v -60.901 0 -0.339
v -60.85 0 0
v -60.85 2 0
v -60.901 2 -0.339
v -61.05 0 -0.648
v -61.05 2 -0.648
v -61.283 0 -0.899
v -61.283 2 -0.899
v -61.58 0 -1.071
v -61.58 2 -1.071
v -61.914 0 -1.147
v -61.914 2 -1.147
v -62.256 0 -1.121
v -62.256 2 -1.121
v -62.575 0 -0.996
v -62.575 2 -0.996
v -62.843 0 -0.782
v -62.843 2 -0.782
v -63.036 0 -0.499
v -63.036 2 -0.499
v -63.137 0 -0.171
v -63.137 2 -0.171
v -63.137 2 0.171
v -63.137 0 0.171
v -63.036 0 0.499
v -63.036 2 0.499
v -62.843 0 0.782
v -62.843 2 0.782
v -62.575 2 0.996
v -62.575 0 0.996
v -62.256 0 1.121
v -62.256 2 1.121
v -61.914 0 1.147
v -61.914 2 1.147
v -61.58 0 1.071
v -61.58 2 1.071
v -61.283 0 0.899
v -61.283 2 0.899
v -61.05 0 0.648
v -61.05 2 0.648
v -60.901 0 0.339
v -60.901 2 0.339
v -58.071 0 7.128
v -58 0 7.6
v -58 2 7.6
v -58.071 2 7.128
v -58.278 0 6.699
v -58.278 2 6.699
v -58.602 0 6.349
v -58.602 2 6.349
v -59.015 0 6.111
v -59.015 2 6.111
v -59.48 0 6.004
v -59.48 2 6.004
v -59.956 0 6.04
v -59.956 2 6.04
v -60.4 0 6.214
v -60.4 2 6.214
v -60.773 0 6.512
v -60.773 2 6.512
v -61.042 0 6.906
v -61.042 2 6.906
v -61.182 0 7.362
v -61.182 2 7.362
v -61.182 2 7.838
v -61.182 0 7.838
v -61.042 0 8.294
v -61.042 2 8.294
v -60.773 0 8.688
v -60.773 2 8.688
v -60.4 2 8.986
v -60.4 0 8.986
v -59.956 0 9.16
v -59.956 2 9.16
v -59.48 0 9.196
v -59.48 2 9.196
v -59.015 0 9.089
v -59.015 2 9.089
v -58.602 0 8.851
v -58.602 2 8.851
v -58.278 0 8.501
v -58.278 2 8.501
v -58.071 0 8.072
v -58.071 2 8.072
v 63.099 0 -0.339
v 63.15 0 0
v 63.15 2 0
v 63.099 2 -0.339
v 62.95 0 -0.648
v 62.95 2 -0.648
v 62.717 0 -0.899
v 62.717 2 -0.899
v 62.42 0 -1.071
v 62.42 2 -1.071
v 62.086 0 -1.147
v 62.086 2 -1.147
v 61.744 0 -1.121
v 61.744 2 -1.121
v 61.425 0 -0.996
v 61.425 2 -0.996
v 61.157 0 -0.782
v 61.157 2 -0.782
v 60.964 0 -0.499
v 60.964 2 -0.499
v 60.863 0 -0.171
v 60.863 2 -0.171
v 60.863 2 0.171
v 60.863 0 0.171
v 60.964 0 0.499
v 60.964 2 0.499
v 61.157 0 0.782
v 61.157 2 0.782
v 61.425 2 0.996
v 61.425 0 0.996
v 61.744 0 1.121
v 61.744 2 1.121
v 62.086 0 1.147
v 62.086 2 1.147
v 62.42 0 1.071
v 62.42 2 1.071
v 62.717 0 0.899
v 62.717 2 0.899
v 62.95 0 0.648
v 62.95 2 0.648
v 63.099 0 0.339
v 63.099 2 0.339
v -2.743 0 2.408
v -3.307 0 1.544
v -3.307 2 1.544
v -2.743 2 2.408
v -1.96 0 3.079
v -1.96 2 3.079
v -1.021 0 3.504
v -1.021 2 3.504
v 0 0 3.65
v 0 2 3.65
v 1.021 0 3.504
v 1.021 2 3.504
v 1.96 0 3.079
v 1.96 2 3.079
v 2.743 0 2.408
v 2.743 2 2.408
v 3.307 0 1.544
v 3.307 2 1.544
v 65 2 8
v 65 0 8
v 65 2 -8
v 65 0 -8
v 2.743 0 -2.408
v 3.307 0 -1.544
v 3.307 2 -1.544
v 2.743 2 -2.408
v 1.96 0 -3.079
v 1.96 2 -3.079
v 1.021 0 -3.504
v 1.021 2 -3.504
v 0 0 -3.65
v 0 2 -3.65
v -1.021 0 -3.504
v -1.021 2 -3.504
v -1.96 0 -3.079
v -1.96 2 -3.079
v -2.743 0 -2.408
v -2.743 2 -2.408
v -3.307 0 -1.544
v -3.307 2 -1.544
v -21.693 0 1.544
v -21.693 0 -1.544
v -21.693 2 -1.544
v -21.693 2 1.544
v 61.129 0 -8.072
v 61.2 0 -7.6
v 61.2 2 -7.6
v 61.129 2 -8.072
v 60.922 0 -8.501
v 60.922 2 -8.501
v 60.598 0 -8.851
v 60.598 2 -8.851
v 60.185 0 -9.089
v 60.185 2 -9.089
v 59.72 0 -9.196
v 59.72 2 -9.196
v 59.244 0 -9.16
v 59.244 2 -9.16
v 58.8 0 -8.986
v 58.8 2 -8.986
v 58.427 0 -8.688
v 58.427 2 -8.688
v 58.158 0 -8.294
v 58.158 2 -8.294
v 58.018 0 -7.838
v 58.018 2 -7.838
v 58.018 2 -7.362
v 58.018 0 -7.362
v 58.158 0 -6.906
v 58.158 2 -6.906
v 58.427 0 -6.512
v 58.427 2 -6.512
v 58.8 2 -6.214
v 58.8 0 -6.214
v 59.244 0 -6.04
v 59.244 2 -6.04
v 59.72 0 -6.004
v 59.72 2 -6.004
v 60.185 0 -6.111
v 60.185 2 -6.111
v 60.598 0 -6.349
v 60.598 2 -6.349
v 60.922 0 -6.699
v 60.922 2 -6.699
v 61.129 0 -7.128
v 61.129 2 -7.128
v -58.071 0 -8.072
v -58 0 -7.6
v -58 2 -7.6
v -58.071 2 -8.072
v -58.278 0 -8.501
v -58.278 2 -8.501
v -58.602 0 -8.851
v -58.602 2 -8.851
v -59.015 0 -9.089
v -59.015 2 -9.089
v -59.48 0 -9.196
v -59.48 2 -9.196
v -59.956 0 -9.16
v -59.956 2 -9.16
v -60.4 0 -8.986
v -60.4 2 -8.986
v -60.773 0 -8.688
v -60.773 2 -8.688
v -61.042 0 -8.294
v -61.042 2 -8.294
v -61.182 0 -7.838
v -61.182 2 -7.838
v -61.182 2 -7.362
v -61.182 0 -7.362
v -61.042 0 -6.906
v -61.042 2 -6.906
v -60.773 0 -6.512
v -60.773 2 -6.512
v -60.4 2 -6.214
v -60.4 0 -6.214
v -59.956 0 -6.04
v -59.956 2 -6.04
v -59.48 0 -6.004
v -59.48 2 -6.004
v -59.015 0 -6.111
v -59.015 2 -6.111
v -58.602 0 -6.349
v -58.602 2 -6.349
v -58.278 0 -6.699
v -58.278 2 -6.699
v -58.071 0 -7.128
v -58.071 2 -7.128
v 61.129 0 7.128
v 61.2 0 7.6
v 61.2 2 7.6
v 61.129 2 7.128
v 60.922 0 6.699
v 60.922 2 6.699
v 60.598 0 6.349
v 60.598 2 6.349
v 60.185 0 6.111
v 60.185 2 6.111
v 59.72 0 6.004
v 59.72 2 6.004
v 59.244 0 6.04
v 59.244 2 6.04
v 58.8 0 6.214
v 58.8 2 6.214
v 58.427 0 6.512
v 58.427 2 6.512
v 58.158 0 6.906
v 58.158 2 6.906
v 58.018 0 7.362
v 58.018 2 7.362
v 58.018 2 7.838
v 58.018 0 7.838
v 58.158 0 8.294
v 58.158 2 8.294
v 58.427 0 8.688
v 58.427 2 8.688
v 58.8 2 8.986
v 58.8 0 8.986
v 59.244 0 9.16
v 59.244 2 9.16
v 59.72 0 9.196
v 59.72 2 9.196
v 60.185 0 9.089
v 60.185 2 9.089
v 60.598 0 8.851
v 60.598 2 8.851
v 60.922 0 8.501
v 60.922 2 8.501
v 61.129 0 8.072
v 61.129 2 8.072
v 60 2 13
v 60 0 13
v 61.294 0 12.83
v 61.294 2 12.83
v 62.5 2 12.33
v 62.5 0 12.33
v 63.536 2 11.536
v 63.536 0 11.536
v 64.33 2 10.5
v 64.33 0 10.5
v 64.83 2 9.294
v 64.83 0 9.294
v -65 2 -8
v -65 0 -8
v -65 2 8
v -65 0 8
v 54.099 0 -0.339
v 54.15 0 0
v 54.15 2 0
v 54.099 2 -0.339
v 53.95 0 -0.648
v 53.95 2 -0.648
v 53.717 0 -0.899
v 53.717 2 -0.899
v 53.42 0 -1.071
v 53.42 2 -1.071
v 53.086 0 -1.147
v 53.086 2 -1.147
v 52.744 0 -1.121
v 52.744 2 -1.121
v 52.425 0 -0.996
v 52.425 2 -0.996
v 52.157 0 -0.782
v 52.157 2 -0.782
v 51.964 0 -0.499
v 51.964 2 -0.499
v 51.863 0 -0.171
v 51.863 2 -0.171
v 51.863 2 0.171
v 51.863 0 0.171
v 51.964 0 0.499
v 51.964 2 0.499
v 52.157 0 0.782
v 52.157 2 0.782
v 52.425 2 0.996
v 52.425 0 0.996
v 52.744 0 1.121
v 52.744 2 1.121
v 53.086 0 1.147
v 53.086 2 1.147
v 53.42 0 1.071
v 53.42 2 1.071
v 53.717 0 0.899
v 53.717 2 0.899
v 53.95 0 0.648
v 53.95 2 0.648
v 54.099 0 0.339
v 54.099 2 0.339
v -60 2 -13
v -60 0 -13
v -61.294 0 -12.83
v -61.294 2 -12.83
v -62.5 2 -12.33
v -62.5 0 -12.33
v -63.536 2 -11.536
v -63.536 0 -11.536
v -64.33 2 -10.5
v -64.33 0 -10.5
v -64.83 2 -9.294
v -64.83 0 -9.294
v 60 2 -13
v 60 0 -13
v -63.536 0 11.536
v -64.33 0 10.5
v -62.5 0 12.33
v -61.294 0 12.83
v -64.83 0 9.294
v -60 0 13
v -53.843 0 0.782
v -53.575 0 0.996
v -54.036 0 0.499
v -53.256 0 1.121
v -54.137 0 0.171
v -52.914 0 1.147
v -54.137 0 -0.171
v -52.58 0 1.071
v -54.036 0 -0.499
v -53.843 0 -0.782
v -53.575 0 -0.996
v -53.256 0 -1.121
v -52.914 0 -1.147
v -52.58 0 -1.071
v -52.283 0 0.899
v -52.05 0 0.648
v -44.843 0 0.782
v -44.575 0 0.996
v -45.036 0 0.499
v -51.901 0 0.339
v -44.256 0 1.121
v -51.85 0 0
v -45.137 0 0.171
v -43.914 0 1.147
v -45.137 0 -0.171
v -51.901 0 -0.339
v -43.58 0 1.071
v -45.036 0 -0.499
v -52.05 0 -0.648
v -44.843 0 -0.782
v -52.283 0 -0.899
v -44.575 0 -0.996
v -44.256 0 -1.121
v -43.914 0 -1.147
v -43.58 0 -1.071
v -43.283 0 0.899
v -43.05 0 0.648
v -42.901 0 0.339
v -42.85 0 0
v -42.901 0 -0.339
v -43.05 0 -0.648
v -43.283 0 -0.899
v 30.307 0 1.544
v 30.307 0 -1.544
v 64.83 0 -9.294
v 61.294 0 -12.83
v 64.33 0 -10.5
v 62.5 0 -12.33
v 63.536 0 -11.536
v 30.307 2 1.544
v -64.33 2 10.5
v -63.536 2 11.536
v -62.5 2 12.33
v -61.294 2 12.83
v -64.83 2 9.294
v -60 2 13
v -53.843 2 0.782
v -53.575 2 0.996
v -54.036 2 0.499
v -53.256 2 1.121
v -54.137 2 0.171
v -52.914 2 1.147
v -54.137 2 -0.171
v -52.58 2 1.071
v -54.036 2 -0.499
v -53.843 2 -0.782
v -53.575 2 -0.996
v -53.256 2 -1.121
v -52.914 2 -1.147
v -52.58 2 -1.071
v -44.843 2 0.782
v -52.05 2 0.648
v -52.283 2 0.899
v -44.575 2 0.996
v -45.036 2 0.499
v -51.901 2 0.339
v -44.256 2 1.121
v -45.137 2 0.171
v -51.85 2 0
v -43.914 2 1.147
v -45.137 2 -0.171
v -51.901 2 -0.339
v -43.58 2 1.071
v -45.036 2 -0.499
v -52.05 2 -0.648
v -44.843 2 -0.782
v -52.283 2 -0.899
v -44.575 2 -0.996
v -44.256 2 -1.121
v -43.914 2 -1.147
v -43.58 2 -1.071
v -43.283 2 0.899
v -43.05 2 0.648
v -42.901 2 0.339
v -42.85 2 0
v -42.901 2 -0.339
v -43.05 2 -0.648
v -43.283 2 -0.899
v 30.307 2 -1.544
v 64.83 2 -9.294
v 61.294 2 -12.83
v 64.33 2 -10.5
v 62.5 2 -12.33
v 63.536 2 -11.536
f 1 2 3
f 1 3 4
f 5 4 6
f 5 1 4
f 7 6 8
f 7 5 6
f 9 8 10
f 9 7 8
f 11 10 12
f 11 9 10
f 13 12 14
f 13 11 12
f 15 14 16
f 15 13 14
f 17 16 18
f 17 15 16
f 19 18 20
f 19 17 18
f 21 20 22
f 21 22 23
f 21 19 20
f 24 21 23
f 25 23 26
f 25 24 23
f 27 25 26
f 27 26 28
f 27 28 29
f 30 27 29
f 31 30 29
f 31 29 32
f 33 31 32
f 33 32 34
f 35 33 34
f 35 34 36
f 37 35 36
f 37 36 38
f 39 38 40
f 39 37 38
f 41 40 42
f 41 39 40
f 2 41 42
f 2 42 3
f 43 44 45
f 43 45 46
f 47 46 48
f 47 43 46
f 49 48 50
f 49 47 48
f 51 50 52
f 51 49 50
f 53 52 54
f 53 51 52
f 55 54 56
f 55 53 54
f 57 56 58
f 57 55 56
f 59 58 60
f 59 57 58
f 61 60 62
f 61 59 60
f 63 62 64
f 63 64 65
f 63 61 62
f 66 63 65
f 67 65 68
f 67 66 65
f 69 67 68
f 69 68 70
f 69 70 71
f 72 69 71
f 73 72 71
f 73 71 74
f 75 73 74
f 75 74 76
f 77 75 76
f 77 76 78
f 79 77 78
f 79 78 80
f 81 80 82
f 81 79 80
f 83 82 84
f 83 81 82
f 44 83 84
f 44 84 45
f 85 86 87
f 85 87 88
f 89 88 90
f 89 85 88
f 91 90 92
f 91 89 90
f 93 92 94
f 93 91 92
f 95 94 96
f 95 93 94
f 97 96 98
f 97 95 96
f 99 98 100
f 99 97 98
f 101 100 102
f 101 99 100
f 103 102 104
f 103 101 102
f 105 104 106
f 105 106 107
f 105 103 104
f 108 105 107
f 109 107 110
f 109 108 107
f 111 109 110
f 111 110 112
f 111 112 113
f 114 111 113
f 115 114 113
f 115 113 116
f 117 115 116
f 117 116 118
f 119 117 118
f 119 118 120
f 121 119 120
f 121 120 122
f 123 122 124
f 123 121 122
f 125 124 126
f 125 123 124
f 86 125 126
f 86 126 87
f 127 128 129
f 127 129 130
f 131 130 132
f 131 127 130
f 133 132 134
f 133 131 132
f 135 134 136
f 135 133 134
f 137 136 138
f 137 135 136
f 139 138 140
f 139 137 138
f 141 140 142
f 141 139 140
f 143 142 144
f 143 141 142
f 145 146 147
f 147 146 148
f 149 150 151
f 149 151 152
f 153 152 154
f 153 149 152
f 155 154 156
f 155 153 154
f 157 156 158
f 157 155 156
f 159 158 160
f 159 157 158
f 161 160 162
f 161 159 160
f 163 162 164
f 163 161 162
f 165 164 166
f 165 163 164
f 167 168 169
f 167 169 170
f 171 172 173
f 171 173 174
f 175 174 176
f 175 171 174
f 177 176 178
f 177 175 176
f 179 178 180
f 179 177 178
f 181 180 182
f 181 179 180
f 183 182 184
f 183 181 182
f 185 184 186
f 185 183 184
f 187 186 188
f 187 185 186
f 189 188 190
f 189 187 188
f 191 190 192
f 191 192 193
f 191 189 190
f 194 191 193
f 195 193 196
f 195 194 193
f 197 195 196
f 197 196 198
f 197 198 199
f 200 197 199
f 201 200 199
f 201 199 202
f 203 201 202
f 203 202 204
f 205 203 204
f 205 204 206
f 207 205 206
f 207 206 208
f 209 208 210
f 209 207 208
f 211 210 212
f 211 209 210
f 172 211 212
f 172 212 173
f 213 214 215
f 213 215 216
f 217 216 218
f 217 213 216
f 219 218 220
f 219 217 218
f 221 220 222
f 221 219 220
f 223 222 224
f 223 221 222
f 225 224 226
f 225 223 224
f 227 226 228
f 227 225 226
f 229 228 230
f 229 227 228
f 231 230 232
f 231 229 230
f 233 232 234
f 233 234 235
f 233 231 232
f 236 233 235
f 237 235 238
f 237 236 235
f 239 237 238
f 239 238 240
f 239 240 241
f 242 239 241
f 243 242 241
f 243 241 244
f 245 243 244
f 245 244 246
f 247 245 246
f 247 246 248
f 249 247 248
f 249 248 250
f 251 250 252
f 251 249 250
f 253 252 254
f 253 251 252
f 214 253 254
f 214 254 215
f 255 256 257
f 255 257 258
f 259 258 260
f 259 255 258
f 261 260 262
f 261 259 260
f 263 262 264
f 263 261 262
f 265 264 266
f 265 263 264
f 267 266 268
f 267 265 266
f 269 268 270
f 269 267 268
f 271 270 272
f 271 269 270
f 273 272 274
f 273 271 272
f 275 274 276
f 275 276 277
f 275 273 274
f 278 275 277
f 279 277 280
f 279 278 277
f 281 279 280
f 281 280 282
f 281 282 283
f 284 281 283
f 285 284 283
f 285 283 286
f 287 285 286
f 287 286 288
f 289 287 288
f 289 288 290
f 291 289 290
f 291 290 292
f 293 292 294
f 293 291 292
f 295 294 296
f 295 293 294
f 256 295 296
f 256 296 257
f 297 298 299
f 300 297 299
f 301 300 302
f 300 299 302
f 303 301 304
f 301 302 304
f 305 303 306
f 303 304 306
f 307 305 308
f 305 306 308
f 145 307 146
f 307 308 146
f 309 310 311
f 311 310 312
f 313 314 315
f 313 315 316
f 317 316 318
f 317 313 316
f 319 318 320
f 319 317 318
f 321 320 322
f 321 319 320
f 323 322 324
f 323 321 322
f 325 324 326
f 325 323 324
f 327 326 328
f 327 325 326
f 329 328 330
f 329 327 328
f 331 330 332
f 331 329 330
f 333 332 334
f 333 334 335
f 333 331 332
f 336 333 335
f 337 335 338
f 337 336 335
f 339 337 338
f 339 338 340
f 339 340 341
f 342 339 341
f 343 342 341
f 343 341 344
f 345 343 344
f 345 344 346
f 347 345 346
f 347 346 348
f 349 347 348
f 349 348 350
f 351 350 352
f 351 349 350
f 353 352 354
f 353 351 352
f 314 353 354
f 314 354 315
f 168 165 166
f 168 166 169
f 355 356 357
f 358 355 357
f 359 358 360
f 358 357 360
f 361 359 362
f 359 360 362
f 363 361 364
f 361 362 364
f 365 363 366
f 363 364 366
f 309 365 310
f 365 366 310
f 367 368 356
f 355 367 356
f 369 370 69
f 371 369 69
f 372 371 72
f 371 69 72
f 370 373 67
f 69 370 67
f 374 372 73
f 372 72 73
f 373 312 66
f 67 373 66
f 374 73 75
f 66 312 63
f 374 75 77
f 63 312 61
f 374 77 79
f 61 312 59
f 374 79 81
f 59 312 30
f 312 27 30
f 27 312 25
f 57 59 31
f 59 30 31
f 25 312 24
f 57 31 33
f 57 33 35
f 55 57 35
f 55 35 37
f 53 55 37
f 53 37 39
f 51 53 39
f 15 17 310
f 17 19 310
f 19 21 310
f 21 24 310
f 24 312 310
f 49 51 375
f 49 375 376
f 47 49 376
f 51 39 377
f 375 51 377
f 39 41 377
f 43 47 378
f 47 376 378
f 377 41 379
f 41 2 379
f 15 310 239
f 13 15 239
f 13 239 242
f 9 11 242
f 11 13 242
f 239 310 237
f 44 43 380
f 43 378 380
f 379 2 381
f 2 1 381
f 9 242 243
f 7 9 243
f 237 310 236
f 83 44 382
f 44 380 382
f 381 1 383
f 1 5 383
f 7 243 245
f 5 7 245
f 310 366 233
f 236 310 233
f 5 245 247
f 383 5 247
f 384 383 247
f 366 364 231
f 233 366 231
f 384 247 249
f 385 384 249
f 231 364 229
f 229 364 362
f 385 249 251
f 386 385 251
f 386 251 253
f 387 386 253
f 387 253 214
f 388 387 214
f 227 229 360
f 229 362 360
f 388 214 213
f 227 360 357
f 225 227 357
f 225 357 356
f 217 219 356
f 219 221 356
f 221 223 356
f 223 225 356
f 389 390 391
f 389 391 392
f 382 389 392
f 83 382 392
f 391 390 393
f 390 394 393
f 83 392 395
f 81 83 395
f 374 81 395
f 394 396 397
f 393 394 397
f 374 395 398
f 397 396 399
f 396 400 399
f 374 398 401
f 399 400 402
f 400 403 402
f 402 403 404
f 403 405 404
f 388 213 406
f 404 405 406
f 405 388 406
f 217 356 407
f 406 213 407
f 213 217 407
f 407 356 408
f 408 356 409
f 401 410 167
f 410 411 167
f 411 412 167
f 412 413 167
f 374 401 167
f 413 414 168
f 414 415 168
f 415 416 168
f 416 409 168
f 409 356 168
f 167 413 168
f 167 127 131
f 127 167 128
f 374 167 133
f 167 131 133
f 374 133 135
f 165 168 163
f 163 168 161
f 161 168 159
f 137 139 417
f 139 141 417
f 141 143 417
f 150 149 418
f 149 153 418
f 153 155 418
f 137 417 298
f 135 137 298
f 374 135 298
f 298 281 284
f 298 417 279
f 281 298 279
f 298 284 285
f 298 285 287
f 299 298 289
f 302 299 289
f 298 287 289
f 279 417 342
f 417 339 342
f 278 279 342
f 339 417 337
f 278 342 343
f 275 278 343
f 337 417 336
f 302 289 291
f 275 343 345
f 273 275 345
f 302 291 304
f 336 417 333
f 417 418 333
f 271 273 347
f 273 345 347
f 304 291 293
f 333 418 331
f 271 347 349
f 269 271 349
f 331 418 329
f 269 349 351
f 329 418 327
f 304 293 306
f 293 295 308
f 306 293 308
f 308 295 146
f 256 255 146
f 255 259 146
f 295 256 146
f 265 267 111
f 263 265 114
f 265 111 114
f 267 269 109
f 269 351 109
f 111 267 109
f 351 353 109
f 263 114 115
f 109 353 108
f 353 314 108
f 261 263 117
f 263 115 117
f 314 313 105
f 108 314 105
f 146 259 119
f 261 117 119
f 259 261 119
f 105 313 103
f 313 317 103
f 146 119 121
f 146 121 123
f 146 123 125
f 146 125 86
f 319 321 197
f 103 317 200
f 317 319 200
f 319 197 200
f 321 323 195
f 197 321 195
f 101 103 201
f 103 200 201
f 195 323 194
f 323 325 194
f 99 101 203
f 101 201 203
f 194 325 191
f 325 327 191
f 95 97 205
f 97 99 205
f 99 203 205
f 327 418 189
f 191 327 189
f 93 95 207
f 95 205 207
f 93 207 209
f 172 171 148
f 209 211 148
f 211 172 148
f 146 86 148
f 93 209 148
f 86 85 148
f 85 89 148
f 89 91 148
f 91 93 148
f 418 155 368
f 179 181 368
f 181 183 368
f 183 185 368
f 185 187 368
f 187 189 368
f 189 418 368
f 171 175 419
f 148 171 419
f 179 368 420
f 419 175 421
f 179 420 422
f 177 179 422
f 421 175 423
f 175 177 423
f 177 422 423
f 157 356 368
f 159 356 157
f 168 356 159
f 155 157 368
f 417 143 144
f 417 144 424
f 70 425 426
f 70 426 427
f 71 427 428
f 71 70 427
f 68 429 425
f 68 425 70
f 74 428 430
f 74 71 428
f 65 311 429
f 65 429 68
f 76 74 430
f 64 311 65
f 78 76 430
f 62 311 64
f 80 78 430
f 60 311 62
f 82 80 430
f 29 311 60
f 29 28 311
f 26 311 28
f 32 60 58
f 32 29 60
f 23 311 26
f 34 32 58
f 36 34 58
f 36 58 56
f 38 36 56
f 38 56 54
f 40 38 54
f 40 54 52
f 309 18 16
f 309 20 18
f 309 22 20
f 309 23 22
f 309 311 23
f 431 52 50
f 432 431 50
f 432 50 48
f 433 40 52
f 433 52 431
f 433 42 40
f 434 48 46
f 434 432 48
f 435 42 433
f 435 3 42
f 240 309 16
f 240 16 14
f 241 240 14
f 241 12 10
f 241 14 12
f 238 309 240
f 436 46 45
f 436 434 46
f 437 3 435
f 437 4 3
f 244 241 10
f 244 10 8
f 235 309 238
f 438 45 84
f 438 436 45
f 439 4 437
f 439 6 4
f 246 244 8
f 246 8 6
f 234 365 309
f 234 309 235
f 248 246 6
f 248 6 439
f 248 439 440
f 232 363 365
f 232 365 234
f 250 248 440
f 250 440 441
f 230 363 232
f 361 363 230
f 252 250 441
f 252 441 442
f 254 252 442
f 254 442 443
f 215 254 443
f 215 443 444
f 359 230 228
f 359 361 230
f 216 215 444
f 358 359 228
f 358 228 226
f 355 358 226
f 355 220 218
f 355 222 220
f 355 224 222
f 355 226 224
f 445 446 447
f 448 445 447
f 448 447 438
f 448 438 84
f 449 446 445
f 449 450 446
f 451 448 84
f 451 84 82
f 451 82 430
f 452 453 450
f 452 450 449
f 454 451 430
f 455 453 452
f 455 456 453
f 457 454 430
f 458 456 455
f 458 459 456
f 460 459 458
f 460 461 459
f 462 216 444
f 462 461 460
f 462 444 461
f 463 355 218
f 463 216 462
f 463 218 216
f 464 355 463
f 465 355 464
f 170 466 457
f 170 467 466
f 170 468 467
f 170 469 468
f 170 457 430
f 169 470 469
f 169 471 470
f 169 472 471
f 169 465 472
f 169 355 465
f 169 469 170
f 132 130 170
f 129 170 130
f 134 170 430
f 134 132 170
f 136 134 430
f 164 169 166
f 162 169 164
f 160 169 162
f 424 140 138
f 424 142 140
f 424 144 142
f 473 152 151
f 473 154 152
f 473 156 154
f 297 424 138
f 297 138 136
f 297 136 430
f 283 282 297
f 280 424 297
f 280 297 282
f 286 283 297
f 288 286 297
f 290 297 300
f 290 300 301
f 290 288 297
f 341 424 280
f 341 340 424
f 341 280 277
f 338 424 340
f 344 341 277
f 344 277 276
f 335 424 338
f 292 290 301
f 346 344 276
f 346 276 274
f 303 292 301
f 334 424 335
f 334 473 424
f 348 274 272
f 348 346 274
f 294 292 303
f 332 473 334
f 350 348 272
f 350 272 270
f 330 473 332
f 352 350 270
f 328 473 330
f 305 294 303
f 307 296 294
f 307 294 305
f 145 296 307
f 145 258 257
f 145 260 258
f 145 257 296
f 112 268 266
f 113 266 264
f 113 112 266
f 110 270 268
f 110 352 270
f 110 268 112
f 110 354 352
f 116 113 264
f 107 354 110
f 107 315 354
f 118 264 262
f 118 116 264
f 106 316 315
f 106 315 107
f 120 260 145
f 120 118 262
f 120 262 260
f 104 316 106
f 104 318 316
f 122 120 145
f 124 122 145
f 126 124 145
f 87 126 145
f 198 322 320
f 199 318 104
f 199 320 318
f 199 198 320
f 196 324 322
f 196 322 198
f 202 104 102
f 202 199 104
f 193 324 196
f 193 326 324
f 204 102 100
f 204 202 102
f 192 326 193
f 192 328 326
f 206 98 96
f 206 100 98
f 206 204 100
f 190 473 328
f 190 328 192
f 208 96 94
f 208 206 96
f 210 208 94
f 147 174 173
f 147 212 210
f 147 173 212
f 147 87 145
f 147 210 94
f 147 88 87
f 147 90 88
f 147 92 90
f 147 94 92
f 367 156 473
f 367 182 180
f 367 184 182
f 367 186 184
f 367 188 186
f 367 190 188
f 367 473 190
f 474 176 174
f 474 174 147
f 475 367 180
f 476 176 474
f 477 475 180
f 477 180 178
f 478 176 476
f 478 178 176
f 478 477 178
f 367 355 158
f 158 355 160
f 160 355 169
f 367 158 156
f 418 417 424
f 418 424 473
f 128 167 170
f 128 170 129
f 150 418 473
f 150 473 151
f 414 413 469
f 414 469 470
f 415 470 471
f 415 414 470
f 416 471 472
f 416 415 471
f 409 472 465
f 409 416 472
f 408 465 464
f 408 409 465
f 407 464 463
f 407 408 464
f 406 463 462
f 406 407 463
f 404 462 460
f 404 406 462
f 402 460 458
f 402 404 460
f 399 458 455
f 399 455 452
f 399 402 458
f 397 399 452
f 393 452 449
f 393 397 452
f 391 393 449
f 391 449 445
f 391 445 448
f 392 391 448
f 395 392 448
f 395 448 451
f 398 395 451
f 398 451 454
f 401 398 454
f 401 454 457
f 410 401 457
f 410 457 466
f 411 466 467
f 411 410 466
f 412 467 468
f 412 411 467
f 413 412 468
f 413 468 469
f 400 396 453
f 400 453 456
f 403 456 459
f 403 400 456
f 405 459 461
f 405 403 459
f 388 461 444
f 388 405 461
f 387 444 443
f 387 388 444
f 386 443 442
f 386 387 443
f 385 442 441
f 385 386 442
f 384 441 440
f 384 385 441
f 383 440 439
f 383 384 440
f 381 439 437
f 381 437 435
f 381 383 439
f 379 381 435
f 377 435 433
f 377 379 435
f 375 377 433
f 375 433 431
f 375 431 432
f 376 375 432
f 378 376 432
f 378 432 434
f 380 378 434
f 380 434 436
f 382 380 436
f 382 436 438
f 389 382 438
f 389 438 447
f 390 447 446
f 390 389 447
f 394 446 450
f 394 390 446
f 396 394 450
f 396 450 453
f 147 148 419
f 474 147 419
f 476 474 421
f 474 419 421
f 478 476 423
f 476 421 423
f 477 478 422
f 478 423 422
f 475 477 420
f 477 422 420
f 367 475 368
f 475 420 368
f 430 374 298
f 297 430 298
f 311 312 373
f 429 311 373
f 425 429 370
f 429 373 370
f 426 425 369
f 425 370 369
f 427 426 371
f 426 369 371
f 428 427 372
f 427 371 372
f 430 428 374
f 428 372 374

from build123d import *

# Parameters (mm, degrees)
ESBO_O1_R                = 1.6
ESBO_O1_R_2              = 1.15
RESSALTO_EXTRUS_O1_DEPTH = 2


with BuildPart() as part:
    # Esboço1 → Ressalto-extrusão1 (new body)
    with BuildSketch(Plane(origin=(0, 0, 0), x_dir=(1, 0, 0), z_dir=(0, 1, 0))):
        with BuildLine():
            Line((-60, -13), (60, -13))
            ThreePointArc((60, -13), (63.535533906, -11.535533906), (65, -8))
            Line((65, -8), (65, 8))
            ThreePointArc((65, 8), (63.535533906, 11.535533906), (60, 13))
            Line((60, 13), (-60, 13))
            ThreePointArc((-60, 13), (-63.535533906, 11.535533906), (-65, 8))
            Line((-65, 8), (-65, -8))
            ThreePointArc((-65, -8), (-63.535533906, -11.535533906), (-60, -13))
        make_face()
        with Locations((59.6, 7.6)):
            Circle(ESBO_O1_R, mode=Mode.SUBTRACT)
        with Locations((59.6, -7.6)):
            Circle(ESBO_O1_R, mode=Mode.SUBTRACT)
        with Locations((62, 0)):
            Circle(ESBO_O1_R_2, mode=Mode.SUBTRACT)
        with Locations((53, 0)):
            Circle(ESBO_O1_R_2, mode=Mode.SUBTRACT)
        with Locations((-59.6, 7.6)):
            Circle(ESBO_O1_R, mode=Mode.SUBTRACT)
        with Locations((-59.6, -7.6)):
            Circle(ESBO_O1_R, mode=Mode.SUBTRACT)
        with Locations((-53, 0)):
            Circle(ESBO_O1_R_2, mode=Mode.SUBTRACT)
        with Locations((-62, 0)):
            Circle(ESBO_O1_R_2, mode=Mode.SUBTRACT)
        with Locations((-44, 0)):
            Circle(ESBO_O1_R_2, mode=Mode.SUBTRACT)
        with BuildLine():
            Line((3.307143995, -1.544441193), (30.307143995, -1.544441193))
            Line((30.307143995, -1.544441193), (30.307143995, 1.544441193))
            Line((30.307143995, 1.544441193), (3.307143995, 1.544441193))
            ThreePointArc((3.307143995, 1.544441193), (0, 3.65), (-3.307143995, 1.544441193))
            Line((-3.307143995, 1.544441193), (-21.692856005, 1.544441193))
            Line((-21.692856005, 1.544441193), (-21.692856005, -1.544441193))
            Line((-21.692856005, -1.544441193), (-3.307143995, -1.544441193))
            ThreePointArc((-3.307143995, -1.544441193), (0, -3.65), (3.307143995, -1.544441193))
        make_face(mode=Mode.SUBTRACT)
    extrude(amount=RESSALTO_EXTRUS_O1_DEPTH)


solid = part.part
